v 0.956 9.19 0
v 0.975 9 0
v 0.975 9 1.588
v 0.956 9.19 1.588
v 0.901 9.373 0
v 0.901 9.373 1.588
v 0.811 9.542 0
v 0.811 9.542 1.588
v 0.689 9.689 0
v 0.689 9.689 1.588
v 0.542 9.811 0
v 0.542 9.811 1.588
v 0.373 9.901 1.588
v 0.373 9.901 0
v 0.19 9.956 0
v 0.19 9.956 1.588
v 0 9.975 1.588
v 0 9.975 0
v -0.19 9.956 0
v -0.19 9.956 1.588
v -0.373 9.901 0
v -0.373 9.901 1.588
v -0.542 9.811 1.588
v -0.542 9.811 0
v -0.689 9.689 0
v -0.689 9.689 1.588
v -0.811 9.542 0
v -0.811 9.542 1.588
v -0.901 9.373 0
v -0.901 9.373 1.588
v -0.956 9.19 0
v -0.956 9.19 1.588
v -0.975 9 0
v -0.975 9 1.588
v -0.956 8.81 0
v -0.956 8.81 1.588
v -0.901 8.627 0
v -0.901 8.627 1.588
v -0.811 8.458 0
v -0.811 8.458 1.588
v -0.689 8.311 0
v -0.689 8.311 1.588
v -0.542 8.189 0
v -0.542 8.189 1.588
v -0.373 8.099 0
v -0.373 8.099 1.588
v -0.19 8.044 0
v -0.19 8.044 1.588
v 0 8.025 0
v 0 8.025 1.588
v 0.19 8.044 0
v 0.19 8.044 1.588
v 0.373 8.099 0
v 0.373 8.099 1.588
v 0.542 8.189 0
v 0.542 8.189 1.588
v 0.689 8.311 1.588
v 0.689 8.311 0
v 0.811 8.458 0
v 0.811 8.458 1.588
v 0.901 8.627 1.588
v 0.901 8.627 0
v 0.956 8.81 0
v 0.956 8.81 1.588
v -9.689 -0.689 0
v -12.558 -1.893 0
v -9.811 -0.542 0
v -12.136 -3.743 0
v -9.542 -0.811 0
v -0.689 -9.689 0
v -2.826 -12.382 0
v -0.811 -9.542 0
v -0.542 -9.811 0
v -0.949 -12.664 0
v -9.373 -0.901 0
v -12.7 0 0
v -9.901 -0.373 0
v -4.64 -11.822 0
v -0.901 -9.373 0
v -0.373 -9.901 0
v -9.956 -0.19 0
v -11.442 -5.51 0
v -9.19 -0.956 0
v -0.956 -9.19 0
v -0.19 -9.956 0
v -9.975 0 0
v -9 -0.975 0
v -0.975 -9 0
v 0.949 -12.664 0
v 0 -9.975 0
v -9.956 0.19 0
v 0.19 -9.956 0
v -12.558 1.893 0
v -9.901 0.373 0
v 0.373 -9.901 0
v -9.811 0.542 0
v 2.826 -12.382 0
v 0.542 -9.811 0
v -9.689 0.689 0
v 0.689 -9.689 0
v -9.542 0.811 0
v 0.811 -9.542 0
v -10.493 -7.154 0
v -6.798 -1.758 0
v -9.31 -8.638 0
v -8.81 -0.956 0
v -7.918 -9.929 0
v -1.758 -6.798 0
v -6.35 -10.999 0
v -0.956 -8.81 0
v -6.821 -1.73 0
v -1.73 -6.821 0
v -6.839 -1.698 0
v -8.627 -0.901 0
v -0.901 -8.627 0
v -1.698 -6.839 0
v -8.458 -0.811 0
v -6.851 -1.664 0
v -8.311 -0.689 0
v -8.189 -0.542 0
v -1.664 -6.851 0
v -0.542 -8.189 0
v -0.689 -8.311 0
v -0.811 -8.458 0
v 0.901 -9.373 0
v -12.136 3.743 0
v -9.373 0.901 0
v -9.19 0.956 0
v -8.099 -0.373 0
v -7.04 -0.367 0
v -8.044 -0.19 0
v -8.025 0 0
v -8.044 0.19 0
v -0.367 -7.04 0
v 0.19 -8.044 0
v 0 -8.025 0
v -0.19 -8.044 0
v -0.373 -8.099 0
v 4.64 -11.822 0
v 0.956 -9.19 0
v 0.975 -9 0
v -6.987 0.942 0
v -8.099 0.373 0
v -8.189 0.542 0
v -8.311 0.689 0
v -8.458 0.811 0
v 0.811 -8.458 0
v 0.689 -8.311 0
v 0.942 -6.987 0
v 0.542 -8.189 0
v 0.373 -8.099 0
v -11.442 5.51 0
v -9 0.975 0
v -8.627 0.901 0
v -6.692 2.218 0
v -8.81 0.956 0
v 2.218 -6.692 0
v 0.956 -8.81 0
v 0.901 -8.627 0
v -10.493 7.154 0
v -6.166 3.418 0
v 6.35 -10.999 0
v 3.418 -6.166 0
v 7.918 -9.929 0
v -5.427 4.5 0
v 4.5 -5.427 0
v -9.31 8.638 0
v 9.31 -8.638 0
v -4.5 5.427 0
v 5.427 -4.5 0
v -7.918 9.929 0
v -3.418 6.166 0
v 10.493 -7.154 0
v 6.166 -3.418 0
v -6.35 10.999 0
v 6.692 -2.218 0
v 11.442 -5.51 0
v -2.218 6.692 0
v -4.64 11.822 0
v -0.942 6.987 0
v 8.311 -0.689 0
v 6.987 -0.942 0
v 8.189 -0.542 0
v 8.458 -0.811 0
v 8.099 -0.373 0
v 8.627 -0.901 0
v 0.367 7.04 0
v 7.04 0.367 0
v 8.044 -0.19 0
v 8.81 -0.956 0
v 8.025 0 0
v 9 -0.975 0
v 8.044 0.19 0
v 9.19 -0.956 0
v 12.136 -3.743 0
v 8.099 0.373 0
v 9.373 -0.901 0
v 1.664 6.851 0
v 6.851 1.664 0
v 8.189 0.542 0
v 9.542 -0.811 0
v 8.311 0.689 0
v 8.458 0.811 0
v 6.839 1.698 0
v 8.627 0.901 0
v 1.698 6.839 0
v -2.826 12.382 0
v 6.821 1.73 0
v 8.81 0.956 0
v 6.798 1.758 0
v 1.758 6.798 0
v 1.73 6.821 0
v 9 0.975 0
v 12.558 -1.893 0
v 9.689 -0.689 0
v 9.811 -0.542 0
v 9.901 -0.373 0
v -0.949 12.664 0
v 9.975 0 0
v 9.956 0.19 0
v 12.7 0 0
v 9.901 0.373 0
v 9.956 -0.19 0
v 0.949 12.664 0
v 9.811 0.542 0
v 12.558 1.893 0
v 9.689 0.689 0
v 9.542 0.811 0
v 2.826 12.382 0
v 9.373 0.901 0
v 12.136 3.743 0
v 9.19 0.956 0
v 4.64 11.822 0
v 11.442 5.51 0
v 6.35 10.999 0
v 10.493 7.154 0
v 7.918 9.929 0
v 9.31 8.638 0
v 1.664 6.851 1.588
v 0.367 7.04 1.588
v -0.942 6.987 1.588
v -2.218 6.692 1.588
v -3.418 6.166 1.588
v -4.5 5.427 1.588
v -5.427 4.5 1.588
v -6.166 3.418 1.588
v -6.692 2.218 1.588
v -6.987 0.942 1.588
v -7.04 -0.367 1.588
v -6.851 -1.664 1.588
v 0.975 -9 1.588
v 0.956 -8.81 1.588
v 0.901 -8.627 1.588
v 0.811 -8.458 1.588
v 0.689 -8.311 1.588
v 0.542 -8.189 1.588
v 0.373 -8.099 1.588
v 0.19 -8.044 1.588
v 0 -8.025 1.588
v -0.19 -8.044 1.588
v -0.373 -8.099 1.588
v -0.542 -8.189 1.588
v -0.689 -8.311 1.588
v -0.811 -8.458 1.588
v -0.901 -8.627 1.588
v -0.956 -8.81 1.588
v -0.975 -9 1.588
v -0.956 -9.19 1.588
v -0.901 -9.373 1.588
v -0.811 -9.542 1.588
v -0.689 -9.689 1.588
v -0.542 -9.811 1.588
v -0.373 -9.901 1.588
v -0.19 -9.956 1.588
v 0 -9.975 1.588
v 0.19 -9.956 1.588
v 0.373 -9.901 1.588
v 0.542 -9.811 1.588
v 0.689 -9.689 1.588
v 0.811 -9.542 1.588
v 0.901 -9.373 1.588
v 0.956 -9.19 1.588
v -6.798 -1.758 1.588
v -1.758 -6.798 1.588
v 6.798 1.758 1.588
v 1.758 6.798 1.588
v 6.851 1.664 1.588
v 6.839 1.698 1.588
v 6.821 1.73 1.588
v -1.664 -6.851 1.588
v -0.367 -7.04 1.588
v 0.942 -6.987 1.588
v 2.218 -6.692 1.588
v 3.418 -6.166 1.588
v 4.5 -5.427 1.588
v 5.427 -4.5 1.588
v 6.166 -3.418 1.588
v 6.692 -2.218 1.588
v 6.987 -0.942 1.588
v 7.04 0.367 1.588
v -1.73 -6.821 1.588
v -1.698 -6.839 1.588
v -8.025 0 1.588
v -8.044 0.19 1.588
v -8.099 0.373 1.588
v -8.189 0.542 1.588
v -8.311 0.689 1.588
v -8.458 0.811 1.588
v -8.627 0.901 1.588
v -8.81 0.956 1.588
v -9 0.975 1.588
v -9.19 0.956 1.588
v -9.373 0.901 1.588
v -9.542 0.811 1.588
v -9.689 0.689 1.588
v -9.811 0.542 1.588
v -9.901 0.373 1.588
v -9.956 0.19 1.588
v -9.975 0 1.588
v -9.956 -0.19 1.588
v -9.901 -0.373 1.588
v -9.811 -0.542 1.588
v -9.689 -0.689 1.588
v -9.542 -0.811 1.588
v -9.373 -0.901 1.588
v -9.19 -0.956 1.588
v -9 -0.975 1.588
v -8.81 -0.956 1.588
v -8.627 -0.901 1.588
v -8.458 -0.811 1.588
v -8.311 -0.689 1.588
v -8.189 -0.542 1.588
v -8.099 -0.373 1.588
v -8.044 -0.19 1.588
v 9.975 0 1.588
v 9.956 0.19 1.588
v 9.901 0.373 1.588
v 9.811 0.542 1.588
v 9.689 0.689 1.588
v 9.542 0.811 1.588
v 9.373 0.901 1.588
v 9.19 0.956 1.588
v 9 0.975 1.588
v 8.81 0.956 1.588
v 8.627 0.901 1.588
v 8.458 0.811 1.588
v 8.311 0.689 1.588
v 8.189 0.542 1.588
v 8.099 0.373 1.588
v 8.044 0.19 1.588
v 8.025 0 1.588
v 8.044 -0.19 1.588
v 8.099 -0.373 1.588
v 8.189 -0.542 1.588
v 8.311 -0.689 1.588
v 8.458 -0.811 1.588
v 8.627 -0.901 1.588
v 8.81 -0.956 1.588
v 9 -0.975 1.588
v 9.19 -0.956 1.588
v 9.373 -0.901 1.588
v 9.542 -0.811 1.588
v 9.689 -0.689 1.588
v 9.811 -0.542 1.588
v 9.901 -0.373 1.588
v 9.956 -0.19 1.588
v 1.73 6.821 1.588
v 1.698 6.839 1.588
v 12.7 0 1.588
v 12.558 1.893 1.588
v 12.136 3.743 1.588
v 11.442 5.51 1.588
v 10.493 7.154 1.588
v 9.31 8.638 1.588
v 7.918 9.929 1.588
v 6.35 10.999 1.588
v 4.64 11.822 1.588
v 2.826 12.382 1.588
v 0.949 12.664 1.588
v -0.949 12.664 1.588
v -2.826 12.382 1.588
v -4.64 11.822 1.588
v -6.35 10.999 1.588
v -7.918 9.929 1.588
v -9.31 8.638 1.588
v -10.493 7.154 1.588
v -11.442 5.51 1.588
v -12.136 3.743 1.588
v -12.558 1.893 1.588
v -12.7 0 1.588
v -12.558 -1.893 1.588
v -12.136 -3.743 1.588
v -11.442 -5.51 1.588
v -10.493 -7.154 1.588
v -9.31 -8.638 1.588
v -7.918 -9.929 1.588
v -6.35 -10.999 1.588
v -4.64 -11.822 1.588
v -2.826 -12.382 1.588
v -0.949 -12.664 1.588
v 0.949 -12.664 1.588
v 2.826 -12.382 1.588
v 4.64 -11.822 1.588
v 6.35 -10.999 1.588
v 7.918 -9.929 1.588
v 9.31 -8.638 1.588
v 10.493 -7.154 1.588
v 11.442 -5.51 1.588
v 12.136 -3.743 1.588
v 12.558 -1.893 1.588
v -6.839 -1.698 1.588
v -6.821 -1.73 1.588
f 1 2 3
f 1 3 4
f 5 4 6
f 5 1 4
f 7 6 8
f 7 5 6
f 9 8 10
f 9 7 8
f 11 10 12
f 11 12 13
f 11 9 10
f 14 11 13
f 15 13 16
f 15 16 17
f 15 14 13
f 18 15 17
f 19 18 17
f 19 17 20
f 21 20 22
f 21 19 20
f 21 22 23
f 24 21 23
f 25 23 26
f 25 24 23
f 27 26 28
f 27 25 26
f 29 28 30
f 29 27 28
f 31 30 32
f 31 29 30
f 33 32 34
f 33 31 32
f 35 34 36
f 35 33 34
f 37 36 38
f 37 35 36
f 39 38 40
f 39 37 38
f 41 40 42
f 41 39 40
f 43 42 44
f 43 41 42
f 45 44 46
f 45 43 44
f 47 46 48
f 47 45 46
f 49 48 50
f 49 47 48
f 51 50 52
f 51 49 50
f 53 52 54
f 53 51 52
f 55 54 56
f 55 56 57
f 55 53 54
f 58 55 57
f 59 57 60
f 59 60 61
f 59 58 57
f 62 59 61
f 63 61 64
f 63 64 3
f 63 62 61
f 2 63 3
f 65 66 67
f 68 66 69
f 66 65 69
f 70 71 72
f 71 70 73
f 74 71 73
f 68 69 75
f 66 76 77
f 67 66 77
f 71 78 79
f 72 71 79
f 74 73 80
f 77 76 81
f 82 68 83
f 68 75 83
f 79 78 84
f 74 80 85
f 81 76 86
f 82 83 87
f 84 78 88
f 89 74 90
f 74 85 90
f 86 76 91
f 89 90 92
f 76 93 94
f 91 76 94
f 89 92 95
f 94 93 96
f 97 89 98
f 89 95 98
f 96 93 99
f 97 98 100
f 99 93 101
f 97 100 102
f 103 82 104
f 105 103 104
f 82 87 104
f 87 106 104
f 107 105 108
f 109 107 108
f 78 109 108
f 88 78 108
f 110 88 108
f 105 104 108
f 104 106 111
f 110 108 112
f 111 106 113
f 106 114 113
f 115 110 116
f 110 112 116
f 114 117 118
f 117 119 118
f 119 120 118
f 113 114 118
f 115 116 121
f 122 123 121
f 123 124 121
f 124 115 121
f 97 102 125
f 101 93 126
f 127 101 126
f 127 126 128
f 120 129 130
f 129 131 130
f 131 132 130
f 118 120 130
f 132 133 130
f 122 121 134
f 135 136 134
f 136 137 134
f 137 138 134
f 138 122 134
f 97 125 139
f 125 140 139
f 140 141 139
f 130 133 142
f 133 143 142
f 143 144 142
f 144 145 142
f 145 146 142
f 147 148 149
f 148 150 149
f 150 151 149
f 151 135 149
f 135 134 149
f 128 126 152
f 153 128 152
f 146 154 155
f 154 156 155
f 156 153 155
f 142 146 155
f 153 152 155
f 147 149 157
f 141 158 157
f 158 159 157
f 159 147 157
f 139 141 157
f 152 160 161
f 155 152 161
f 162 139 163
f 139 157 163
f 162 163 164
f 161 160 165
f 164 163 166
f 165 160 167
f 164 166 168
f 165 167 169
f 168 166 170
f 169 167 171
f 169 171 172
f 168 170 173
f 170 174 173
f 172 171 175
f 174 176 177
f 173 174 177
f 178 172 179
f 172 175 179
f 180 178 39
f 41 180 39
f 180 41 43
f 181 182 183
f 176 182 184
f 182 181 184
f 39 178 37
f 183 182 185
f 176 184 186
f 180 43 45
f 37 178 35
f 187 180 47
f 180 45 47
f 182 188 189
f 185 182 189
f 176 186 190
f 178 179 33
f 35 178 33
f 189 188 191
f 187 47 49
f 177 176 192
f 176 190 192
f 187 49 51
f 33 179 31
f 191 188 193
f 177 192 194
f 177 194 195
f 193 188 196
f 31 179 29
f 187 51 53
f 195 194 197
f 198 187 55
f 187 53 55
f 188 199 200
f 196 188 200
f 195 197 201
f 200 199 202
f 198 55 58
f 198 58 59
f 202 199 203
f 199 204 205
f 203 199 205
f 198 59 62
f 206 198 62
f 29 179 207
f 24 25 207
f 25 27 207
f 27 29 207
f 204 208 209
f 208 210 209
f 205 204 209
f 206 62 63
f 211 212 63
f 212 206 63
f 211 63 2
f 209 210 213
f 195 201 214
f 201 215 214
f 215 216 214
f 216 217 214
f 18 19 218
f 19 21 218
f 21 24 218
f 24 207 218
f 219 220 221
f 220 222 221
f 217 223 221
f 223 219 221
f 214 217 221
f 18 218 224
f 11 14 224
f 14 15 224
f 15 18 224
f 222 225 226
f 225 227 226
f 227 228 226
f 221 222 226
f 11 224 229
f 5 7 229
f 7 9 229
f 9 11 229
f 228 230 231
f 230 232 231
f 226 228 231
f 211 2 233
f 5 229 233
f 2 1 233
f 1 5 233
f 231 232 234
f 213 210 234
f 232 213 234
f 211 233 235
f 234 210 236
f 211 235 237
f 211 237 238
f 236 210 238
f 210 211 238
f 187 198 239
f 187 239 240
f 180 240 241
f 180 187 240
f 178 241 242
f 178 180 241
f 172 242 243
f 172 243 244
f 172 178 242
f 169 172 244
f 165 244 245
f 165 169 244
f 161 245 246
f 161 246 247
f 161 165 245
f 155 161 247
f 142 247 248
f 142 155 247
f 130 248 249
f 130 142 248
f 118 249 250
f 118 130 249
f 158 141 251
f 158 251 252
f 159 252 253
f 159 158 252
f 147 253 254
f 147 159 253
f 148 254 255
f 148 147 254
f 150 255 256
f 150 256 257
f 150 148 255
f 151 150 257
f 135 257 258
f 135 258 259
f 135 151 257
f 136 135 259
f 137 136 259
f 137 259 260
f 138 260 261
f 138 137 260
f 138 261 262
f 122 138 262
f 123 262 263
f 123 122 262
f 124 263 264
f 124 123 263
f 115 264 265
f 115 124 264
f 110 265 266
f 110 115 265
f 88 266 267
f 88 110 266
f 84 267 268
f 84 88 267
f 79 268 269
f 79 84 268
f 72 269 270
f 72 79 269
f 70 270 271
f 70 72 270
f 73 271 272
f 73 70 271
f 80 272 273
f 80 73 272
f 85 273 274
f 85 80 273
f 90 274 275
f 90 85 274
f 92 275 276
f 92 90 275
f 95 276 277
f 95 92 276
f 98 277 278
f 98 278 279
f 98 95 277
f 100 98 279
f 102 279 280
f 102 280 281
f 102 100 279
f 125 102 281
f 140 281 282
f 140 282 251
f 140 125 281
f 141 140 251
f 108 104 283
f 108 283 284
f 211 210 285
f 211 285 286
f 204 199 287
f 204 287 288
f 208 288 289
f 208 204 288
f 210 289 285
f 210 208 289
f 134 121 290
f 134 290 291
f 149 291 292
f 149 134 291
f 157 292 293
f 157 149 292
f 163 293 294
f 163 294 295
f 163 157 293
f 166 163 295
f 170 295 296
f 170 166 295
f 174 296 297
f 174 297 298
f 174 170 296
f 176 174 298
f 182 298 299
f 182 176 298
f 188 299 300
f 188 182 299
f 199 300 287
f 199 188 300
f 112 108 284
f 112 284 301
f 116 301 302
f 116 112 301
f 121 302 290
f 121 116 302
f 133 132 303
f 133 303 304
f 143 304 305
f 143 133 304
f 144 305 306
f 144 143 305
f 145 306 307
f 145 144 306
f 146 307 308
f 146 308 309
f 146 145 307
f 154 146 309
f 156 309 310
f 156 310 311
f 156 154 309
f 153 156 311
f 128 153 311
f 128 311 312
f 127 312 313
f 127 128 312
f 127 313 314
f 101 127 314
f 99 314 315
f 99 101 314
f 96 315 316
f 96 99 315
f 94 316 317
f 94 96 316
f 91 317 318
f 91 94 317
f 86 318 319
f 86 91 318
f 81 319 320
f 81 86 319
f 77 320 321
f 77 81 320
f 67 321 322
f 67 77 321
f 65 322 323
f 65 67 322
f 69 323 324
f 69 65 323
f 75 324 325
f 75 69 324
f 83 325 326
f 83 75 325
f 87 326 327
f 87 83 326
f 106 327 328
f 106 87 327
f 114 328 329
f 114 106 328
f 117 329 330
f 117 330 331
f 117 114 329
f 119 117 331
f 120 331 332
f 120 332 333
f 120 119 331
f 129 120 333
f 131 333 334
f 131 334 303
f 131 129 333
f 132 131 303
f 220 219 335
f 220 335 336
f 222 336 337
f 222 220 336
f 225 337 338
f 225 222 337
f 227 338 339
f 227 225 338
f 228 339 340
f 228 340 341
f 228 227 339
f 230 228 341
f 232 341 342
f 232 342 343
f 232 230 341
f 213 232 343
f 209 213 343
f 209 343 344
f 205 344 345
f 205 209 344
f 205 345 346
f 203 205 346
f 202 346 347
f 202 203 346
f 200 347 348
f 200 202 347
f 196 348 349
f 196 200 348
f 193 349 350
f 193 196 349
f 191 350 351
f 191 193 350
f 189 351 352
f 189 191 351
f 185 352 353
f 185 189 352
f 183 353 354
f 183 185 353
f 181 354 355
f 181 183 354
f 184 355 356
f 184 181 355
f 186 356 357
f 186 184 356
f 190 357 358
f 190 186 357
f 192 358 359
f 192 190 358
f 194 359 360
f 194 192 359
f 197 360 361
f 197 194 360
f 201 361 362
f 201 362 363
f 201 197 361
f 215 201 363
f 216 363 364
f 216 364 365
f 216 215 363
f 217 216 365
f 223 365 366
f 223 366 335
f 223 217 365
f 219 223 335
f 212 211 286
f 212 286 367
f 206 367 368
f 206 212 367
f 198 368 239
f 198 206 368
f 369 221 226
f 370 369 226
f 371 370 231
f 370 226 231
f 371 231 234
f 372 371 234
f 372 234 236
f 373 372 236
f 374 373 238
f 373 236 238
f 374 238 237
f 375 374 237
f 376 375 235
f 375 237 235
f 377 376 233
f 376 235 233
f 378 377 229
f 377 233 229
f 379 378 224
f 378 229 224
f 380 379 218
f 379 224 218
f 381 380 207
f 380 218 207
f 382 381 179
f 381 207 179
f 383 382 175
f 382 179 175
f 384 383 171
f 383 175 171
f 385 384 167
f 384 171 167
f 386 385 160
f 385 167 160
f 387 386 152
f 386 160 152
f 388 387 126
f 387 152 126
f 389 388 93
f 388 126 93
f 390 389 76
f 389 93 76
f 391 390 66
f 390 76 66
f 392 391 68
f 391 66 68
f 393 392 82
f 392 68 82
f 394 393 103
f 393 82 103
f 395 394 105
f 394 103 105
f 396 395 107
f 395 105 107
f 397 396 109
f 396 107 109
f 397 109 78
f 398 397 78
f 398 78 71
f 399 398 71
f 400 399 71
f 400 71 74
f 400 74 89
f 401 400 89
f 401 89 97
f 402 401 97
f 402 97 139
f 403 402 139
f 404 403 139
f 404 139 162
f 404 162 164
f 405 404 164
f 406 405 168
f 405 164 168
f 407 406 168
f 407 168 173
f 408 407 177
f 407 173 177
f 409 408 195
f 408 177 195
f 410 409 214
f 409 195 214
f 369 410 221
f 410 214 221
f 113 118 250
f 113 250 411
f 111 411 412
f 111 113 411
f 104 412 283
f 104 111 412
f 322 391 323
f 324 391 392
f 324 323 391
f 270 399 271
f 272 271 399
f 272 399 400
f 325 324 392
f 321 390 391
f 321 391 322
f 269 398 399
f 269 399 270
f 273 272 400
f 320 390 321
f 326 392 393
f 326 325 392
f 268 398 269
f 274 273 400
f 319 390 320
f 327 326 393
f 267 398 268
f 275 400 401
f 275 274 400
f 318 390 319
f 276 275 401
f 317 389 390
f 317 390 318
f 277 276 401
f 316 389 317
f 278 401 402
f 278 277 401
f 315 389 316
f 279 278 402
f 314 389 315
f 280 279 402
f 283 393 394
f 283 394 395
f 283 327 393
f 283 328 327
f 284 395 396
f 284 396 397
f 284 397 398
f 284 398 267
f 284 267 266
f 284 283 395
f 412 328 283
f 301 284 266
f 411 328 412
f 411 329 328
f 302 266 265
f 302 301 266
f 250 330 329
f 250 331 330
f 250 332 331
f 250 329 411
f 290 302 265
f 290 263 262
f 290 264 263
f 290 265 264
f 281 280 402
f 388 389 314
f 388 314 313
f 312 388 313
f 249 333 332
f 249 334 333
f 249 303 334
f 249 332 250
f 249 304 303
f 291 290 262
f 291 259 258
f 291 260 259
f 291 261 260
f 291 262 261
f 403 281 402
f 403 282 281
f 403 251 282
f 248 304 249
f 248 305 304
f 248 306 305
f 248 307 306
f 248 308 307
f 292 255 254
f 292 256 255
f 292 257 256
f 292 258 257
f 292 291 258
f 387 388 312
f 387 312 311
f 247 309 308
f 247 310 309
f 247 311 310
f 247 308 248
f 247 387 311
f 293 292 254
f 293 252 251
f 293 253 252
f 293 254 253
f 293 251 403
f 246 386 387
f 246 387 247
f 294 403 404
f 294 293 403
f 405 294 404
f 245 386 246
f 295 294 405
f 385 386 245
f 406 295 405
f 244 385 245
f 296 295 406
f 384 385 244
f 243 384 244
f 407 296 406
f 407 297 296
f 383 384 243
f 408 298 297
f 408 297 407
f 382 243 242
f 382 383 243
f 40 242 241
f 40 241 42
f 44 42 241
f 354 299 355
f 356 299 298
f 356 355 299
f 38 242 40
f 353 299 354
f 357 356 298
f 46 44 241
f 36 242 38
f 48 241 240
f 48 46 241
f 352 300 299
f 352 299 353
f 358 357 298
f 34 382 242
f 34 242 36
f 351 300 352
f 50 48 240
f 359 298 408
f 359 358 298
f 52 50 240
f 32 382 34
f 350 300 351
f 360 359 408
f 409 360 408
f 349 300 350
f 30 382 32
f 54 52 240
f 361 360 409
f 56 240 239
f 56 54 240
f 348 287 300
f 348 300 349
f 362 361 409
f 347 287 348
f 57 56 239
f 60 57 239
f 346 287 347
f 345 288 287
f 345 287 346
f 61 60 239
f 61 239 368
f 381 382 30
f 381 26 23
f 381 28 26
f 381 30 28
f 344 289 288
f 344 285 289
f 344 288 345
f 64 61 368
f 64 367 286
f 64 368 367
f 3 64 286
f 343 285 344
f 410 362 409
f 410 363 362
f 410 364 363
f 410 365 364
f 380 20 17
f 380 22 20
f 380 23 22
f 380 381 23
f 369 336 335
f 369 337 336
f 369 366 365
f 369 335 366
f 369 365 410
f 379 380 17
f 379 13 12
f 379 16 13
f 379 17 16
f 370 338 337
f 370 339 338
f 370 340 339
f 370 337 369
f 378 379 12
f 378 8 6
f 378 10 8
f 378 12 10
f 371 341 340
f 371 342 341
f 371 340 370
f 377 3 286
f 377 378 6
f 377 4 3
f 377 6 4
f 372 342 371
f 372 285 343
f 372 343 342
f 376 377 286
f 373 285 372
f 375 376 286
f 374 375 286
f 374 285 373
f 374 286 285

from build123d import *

# Parameters (mm, degrees)
SKETCH3_R           = 12.7
SKETCH3_R_2         = 0.975
BOSS_EXTRUDE2_DEPTH = 1.5875


with BuildPart() as part:
    # Sketch3 → Boss-Extrude2 (new body)
    with BuildSketch(Plane.XY):
        Circle(SKETCH3_R)
        with BuildLine():
            ThreePointArc((6.269554118, 8.885849209), (0, 10.875), (-6.269554118, 8.885849209))
            Line((-6.269554118, 8.885849209), (-5.055813485, 7.672108576))
            ThreePointArc((-5.055813485, 7.672108576), (-5.055813485, 5.055813485), (-7.672108576, 5.055813485))
            Line((-7.672108576, 5.055813485), (-8.885849209, 6.269554118))
            ThreePointArc((-8.885849209, 6.269554118), (-10.875, 0), (-8.885849209, -6.269554118))
            Line((-8.885849209, -6.269554118), (-7.672108576, -5.055813485))
            ThreePointArc((-7.672108576, -5.055813485), (-5.055813485, -5.055813485), (-5.055813485, -7.672108576))
            Line((-5.055813485, -7.672108576), (-6.269554118, -8.885849209))
            ThreePointArc((-6.269554118, -8.885849209), (0, -10.875), (6.269554118, -8.885849209))
            Line((6.269554118, -8.885849209), (5.055813485, -7.672108576))
            ThreePointArc((5.055813485, -7.672108576), (5.055813485, -5.055813485), (7.672108576, -5.055813485))
            Line((7.672108576, -5.055813485), (8.885849209, -6.269554118))
            ThreePointArc((8.885849209, -6.269554118), (10.875, 0), (8.885849209, 6.269554118))
            Line((8.885849209, 6.269554118), (7.672108576, 5.055813485))
            ThreePointArc((7.672108576, 5.055813485), (5.055813485, 5.055813485), (5.055813485, 7.672108576))
            Line((5.055813485, 7.672108576), (6.269554118, 8.885849209))
        make_face(mode=Mode.SUBTRACT)
        with BuildLine():
            Line((5.055813485, 7.672108576), (6.269554118, 8.885849209))
            ThreePointArc((6.269554118, 8.885849209), (0, 10.875), (-6.269554118, 8.885849209))
            Line((-6.269554118, 8.885849209), (-5.055813485, 7.672108576))
            ThreePointArc((-5.055813485, 7.672108576), (-5.055813485, 5.055813485), (-7.672108576, 5.055813485))
            Line((-7.672108576, 5.055813485), (-8.885849209, 6.269554118))
            ThreePointArc((-8.885849209, 6.269554118), (-10.875, 0), (-8.885849209, -6.269554118))
            Line((-8.885849209, -6.269554118), (-7.672108576, -5.055813485))
            ThreePointArc((-7.672108576, -5.055813485), (-5.055813485, -5.055813485), (-5.055813485, -7.672108576))
            Line((-5.055813485, -7.672108576), (-6.269554118, -8.885849209))
            ThreePointArc((-6.269554118, -8.885849209), (0, -10.875), (6.269554118, -8.885849209))
            Line((6.269554118, -8.885849209), (5.055813485, -7.672108576))
            ThreePointArc((5.055813485, -7.672108576), (5.055813485, -5.055813485), (7.672108576, -5.055813485))
            Line((7.672108576, -5.055813485), (8.885849209, -6.269554118))
            ThreePointArc((8.885849209, -6.269554118), (10.875, 0), (8.885849209, 6.269554118))
            Line((8.885849209, 6.269554118), (7.672108576, 5.055813485))
            ThreePointArc((7.672108576, 5.055813485), (5.055813485, 5.055813485), (5.055813485, 7.672108576))
        make_face()
        with Locations((0, 9.000000134)):
            Circle(SKETCH3_R_2, mode=Mode.SUBTRACT)
        with Locations((9.000000134, 0)):
            Circle(SKETCH3_R_2, mode=Mode.SUBTRACT)
        with Locations((0, -9.000000134)):
            Circle(SKETCH3_R_2, mode=Mode.SUBTRACT)
        with Locations((-9.000000134, 0)):
            Circle(SKETCH3_R_2, mode=Mode.SUBTRACT)
        with BuildLine():
            ThreePointArc((6.850845531, 1.663855614), (6.830865544, 1.714608205), (6.79791666, 1.758075393))
            Line((6.79791666, 1.758075393), (1.758075393, 6.79791666))
            ThreePointArc((1.758075393, 6.79791666), (1.714608205, 6.830865544), (1.663855614, 6.850845531))
            ThreePointArc((1.663855614, 6.850845531), (-4.985102807, 4.985102807), (-6.850845531, -1.663855614))
            ThreePointArc((-6.850845531, -1.663855614), (-6.830865544, -1.714608205), (-6.79791666, -1.758075393))
            Line((-6.79791666, -1.758075393), (-1.758075393, -6.79791666))
            ThreePointArc((-1.758075393, -6.79791666), (-1.714608205, -6.830865544), (-1.663855614, -6.850845531))
            ThreePointArc((-1.663855614, -6.850845531), (4.985102807, -4.985102807), (6.850845531, 1.663855614))
        make_face(mode=Mode.SUBTRACT)
    extrude(amount=BOSS_EXTRUDE2_DEPTH)


solid = part.part
